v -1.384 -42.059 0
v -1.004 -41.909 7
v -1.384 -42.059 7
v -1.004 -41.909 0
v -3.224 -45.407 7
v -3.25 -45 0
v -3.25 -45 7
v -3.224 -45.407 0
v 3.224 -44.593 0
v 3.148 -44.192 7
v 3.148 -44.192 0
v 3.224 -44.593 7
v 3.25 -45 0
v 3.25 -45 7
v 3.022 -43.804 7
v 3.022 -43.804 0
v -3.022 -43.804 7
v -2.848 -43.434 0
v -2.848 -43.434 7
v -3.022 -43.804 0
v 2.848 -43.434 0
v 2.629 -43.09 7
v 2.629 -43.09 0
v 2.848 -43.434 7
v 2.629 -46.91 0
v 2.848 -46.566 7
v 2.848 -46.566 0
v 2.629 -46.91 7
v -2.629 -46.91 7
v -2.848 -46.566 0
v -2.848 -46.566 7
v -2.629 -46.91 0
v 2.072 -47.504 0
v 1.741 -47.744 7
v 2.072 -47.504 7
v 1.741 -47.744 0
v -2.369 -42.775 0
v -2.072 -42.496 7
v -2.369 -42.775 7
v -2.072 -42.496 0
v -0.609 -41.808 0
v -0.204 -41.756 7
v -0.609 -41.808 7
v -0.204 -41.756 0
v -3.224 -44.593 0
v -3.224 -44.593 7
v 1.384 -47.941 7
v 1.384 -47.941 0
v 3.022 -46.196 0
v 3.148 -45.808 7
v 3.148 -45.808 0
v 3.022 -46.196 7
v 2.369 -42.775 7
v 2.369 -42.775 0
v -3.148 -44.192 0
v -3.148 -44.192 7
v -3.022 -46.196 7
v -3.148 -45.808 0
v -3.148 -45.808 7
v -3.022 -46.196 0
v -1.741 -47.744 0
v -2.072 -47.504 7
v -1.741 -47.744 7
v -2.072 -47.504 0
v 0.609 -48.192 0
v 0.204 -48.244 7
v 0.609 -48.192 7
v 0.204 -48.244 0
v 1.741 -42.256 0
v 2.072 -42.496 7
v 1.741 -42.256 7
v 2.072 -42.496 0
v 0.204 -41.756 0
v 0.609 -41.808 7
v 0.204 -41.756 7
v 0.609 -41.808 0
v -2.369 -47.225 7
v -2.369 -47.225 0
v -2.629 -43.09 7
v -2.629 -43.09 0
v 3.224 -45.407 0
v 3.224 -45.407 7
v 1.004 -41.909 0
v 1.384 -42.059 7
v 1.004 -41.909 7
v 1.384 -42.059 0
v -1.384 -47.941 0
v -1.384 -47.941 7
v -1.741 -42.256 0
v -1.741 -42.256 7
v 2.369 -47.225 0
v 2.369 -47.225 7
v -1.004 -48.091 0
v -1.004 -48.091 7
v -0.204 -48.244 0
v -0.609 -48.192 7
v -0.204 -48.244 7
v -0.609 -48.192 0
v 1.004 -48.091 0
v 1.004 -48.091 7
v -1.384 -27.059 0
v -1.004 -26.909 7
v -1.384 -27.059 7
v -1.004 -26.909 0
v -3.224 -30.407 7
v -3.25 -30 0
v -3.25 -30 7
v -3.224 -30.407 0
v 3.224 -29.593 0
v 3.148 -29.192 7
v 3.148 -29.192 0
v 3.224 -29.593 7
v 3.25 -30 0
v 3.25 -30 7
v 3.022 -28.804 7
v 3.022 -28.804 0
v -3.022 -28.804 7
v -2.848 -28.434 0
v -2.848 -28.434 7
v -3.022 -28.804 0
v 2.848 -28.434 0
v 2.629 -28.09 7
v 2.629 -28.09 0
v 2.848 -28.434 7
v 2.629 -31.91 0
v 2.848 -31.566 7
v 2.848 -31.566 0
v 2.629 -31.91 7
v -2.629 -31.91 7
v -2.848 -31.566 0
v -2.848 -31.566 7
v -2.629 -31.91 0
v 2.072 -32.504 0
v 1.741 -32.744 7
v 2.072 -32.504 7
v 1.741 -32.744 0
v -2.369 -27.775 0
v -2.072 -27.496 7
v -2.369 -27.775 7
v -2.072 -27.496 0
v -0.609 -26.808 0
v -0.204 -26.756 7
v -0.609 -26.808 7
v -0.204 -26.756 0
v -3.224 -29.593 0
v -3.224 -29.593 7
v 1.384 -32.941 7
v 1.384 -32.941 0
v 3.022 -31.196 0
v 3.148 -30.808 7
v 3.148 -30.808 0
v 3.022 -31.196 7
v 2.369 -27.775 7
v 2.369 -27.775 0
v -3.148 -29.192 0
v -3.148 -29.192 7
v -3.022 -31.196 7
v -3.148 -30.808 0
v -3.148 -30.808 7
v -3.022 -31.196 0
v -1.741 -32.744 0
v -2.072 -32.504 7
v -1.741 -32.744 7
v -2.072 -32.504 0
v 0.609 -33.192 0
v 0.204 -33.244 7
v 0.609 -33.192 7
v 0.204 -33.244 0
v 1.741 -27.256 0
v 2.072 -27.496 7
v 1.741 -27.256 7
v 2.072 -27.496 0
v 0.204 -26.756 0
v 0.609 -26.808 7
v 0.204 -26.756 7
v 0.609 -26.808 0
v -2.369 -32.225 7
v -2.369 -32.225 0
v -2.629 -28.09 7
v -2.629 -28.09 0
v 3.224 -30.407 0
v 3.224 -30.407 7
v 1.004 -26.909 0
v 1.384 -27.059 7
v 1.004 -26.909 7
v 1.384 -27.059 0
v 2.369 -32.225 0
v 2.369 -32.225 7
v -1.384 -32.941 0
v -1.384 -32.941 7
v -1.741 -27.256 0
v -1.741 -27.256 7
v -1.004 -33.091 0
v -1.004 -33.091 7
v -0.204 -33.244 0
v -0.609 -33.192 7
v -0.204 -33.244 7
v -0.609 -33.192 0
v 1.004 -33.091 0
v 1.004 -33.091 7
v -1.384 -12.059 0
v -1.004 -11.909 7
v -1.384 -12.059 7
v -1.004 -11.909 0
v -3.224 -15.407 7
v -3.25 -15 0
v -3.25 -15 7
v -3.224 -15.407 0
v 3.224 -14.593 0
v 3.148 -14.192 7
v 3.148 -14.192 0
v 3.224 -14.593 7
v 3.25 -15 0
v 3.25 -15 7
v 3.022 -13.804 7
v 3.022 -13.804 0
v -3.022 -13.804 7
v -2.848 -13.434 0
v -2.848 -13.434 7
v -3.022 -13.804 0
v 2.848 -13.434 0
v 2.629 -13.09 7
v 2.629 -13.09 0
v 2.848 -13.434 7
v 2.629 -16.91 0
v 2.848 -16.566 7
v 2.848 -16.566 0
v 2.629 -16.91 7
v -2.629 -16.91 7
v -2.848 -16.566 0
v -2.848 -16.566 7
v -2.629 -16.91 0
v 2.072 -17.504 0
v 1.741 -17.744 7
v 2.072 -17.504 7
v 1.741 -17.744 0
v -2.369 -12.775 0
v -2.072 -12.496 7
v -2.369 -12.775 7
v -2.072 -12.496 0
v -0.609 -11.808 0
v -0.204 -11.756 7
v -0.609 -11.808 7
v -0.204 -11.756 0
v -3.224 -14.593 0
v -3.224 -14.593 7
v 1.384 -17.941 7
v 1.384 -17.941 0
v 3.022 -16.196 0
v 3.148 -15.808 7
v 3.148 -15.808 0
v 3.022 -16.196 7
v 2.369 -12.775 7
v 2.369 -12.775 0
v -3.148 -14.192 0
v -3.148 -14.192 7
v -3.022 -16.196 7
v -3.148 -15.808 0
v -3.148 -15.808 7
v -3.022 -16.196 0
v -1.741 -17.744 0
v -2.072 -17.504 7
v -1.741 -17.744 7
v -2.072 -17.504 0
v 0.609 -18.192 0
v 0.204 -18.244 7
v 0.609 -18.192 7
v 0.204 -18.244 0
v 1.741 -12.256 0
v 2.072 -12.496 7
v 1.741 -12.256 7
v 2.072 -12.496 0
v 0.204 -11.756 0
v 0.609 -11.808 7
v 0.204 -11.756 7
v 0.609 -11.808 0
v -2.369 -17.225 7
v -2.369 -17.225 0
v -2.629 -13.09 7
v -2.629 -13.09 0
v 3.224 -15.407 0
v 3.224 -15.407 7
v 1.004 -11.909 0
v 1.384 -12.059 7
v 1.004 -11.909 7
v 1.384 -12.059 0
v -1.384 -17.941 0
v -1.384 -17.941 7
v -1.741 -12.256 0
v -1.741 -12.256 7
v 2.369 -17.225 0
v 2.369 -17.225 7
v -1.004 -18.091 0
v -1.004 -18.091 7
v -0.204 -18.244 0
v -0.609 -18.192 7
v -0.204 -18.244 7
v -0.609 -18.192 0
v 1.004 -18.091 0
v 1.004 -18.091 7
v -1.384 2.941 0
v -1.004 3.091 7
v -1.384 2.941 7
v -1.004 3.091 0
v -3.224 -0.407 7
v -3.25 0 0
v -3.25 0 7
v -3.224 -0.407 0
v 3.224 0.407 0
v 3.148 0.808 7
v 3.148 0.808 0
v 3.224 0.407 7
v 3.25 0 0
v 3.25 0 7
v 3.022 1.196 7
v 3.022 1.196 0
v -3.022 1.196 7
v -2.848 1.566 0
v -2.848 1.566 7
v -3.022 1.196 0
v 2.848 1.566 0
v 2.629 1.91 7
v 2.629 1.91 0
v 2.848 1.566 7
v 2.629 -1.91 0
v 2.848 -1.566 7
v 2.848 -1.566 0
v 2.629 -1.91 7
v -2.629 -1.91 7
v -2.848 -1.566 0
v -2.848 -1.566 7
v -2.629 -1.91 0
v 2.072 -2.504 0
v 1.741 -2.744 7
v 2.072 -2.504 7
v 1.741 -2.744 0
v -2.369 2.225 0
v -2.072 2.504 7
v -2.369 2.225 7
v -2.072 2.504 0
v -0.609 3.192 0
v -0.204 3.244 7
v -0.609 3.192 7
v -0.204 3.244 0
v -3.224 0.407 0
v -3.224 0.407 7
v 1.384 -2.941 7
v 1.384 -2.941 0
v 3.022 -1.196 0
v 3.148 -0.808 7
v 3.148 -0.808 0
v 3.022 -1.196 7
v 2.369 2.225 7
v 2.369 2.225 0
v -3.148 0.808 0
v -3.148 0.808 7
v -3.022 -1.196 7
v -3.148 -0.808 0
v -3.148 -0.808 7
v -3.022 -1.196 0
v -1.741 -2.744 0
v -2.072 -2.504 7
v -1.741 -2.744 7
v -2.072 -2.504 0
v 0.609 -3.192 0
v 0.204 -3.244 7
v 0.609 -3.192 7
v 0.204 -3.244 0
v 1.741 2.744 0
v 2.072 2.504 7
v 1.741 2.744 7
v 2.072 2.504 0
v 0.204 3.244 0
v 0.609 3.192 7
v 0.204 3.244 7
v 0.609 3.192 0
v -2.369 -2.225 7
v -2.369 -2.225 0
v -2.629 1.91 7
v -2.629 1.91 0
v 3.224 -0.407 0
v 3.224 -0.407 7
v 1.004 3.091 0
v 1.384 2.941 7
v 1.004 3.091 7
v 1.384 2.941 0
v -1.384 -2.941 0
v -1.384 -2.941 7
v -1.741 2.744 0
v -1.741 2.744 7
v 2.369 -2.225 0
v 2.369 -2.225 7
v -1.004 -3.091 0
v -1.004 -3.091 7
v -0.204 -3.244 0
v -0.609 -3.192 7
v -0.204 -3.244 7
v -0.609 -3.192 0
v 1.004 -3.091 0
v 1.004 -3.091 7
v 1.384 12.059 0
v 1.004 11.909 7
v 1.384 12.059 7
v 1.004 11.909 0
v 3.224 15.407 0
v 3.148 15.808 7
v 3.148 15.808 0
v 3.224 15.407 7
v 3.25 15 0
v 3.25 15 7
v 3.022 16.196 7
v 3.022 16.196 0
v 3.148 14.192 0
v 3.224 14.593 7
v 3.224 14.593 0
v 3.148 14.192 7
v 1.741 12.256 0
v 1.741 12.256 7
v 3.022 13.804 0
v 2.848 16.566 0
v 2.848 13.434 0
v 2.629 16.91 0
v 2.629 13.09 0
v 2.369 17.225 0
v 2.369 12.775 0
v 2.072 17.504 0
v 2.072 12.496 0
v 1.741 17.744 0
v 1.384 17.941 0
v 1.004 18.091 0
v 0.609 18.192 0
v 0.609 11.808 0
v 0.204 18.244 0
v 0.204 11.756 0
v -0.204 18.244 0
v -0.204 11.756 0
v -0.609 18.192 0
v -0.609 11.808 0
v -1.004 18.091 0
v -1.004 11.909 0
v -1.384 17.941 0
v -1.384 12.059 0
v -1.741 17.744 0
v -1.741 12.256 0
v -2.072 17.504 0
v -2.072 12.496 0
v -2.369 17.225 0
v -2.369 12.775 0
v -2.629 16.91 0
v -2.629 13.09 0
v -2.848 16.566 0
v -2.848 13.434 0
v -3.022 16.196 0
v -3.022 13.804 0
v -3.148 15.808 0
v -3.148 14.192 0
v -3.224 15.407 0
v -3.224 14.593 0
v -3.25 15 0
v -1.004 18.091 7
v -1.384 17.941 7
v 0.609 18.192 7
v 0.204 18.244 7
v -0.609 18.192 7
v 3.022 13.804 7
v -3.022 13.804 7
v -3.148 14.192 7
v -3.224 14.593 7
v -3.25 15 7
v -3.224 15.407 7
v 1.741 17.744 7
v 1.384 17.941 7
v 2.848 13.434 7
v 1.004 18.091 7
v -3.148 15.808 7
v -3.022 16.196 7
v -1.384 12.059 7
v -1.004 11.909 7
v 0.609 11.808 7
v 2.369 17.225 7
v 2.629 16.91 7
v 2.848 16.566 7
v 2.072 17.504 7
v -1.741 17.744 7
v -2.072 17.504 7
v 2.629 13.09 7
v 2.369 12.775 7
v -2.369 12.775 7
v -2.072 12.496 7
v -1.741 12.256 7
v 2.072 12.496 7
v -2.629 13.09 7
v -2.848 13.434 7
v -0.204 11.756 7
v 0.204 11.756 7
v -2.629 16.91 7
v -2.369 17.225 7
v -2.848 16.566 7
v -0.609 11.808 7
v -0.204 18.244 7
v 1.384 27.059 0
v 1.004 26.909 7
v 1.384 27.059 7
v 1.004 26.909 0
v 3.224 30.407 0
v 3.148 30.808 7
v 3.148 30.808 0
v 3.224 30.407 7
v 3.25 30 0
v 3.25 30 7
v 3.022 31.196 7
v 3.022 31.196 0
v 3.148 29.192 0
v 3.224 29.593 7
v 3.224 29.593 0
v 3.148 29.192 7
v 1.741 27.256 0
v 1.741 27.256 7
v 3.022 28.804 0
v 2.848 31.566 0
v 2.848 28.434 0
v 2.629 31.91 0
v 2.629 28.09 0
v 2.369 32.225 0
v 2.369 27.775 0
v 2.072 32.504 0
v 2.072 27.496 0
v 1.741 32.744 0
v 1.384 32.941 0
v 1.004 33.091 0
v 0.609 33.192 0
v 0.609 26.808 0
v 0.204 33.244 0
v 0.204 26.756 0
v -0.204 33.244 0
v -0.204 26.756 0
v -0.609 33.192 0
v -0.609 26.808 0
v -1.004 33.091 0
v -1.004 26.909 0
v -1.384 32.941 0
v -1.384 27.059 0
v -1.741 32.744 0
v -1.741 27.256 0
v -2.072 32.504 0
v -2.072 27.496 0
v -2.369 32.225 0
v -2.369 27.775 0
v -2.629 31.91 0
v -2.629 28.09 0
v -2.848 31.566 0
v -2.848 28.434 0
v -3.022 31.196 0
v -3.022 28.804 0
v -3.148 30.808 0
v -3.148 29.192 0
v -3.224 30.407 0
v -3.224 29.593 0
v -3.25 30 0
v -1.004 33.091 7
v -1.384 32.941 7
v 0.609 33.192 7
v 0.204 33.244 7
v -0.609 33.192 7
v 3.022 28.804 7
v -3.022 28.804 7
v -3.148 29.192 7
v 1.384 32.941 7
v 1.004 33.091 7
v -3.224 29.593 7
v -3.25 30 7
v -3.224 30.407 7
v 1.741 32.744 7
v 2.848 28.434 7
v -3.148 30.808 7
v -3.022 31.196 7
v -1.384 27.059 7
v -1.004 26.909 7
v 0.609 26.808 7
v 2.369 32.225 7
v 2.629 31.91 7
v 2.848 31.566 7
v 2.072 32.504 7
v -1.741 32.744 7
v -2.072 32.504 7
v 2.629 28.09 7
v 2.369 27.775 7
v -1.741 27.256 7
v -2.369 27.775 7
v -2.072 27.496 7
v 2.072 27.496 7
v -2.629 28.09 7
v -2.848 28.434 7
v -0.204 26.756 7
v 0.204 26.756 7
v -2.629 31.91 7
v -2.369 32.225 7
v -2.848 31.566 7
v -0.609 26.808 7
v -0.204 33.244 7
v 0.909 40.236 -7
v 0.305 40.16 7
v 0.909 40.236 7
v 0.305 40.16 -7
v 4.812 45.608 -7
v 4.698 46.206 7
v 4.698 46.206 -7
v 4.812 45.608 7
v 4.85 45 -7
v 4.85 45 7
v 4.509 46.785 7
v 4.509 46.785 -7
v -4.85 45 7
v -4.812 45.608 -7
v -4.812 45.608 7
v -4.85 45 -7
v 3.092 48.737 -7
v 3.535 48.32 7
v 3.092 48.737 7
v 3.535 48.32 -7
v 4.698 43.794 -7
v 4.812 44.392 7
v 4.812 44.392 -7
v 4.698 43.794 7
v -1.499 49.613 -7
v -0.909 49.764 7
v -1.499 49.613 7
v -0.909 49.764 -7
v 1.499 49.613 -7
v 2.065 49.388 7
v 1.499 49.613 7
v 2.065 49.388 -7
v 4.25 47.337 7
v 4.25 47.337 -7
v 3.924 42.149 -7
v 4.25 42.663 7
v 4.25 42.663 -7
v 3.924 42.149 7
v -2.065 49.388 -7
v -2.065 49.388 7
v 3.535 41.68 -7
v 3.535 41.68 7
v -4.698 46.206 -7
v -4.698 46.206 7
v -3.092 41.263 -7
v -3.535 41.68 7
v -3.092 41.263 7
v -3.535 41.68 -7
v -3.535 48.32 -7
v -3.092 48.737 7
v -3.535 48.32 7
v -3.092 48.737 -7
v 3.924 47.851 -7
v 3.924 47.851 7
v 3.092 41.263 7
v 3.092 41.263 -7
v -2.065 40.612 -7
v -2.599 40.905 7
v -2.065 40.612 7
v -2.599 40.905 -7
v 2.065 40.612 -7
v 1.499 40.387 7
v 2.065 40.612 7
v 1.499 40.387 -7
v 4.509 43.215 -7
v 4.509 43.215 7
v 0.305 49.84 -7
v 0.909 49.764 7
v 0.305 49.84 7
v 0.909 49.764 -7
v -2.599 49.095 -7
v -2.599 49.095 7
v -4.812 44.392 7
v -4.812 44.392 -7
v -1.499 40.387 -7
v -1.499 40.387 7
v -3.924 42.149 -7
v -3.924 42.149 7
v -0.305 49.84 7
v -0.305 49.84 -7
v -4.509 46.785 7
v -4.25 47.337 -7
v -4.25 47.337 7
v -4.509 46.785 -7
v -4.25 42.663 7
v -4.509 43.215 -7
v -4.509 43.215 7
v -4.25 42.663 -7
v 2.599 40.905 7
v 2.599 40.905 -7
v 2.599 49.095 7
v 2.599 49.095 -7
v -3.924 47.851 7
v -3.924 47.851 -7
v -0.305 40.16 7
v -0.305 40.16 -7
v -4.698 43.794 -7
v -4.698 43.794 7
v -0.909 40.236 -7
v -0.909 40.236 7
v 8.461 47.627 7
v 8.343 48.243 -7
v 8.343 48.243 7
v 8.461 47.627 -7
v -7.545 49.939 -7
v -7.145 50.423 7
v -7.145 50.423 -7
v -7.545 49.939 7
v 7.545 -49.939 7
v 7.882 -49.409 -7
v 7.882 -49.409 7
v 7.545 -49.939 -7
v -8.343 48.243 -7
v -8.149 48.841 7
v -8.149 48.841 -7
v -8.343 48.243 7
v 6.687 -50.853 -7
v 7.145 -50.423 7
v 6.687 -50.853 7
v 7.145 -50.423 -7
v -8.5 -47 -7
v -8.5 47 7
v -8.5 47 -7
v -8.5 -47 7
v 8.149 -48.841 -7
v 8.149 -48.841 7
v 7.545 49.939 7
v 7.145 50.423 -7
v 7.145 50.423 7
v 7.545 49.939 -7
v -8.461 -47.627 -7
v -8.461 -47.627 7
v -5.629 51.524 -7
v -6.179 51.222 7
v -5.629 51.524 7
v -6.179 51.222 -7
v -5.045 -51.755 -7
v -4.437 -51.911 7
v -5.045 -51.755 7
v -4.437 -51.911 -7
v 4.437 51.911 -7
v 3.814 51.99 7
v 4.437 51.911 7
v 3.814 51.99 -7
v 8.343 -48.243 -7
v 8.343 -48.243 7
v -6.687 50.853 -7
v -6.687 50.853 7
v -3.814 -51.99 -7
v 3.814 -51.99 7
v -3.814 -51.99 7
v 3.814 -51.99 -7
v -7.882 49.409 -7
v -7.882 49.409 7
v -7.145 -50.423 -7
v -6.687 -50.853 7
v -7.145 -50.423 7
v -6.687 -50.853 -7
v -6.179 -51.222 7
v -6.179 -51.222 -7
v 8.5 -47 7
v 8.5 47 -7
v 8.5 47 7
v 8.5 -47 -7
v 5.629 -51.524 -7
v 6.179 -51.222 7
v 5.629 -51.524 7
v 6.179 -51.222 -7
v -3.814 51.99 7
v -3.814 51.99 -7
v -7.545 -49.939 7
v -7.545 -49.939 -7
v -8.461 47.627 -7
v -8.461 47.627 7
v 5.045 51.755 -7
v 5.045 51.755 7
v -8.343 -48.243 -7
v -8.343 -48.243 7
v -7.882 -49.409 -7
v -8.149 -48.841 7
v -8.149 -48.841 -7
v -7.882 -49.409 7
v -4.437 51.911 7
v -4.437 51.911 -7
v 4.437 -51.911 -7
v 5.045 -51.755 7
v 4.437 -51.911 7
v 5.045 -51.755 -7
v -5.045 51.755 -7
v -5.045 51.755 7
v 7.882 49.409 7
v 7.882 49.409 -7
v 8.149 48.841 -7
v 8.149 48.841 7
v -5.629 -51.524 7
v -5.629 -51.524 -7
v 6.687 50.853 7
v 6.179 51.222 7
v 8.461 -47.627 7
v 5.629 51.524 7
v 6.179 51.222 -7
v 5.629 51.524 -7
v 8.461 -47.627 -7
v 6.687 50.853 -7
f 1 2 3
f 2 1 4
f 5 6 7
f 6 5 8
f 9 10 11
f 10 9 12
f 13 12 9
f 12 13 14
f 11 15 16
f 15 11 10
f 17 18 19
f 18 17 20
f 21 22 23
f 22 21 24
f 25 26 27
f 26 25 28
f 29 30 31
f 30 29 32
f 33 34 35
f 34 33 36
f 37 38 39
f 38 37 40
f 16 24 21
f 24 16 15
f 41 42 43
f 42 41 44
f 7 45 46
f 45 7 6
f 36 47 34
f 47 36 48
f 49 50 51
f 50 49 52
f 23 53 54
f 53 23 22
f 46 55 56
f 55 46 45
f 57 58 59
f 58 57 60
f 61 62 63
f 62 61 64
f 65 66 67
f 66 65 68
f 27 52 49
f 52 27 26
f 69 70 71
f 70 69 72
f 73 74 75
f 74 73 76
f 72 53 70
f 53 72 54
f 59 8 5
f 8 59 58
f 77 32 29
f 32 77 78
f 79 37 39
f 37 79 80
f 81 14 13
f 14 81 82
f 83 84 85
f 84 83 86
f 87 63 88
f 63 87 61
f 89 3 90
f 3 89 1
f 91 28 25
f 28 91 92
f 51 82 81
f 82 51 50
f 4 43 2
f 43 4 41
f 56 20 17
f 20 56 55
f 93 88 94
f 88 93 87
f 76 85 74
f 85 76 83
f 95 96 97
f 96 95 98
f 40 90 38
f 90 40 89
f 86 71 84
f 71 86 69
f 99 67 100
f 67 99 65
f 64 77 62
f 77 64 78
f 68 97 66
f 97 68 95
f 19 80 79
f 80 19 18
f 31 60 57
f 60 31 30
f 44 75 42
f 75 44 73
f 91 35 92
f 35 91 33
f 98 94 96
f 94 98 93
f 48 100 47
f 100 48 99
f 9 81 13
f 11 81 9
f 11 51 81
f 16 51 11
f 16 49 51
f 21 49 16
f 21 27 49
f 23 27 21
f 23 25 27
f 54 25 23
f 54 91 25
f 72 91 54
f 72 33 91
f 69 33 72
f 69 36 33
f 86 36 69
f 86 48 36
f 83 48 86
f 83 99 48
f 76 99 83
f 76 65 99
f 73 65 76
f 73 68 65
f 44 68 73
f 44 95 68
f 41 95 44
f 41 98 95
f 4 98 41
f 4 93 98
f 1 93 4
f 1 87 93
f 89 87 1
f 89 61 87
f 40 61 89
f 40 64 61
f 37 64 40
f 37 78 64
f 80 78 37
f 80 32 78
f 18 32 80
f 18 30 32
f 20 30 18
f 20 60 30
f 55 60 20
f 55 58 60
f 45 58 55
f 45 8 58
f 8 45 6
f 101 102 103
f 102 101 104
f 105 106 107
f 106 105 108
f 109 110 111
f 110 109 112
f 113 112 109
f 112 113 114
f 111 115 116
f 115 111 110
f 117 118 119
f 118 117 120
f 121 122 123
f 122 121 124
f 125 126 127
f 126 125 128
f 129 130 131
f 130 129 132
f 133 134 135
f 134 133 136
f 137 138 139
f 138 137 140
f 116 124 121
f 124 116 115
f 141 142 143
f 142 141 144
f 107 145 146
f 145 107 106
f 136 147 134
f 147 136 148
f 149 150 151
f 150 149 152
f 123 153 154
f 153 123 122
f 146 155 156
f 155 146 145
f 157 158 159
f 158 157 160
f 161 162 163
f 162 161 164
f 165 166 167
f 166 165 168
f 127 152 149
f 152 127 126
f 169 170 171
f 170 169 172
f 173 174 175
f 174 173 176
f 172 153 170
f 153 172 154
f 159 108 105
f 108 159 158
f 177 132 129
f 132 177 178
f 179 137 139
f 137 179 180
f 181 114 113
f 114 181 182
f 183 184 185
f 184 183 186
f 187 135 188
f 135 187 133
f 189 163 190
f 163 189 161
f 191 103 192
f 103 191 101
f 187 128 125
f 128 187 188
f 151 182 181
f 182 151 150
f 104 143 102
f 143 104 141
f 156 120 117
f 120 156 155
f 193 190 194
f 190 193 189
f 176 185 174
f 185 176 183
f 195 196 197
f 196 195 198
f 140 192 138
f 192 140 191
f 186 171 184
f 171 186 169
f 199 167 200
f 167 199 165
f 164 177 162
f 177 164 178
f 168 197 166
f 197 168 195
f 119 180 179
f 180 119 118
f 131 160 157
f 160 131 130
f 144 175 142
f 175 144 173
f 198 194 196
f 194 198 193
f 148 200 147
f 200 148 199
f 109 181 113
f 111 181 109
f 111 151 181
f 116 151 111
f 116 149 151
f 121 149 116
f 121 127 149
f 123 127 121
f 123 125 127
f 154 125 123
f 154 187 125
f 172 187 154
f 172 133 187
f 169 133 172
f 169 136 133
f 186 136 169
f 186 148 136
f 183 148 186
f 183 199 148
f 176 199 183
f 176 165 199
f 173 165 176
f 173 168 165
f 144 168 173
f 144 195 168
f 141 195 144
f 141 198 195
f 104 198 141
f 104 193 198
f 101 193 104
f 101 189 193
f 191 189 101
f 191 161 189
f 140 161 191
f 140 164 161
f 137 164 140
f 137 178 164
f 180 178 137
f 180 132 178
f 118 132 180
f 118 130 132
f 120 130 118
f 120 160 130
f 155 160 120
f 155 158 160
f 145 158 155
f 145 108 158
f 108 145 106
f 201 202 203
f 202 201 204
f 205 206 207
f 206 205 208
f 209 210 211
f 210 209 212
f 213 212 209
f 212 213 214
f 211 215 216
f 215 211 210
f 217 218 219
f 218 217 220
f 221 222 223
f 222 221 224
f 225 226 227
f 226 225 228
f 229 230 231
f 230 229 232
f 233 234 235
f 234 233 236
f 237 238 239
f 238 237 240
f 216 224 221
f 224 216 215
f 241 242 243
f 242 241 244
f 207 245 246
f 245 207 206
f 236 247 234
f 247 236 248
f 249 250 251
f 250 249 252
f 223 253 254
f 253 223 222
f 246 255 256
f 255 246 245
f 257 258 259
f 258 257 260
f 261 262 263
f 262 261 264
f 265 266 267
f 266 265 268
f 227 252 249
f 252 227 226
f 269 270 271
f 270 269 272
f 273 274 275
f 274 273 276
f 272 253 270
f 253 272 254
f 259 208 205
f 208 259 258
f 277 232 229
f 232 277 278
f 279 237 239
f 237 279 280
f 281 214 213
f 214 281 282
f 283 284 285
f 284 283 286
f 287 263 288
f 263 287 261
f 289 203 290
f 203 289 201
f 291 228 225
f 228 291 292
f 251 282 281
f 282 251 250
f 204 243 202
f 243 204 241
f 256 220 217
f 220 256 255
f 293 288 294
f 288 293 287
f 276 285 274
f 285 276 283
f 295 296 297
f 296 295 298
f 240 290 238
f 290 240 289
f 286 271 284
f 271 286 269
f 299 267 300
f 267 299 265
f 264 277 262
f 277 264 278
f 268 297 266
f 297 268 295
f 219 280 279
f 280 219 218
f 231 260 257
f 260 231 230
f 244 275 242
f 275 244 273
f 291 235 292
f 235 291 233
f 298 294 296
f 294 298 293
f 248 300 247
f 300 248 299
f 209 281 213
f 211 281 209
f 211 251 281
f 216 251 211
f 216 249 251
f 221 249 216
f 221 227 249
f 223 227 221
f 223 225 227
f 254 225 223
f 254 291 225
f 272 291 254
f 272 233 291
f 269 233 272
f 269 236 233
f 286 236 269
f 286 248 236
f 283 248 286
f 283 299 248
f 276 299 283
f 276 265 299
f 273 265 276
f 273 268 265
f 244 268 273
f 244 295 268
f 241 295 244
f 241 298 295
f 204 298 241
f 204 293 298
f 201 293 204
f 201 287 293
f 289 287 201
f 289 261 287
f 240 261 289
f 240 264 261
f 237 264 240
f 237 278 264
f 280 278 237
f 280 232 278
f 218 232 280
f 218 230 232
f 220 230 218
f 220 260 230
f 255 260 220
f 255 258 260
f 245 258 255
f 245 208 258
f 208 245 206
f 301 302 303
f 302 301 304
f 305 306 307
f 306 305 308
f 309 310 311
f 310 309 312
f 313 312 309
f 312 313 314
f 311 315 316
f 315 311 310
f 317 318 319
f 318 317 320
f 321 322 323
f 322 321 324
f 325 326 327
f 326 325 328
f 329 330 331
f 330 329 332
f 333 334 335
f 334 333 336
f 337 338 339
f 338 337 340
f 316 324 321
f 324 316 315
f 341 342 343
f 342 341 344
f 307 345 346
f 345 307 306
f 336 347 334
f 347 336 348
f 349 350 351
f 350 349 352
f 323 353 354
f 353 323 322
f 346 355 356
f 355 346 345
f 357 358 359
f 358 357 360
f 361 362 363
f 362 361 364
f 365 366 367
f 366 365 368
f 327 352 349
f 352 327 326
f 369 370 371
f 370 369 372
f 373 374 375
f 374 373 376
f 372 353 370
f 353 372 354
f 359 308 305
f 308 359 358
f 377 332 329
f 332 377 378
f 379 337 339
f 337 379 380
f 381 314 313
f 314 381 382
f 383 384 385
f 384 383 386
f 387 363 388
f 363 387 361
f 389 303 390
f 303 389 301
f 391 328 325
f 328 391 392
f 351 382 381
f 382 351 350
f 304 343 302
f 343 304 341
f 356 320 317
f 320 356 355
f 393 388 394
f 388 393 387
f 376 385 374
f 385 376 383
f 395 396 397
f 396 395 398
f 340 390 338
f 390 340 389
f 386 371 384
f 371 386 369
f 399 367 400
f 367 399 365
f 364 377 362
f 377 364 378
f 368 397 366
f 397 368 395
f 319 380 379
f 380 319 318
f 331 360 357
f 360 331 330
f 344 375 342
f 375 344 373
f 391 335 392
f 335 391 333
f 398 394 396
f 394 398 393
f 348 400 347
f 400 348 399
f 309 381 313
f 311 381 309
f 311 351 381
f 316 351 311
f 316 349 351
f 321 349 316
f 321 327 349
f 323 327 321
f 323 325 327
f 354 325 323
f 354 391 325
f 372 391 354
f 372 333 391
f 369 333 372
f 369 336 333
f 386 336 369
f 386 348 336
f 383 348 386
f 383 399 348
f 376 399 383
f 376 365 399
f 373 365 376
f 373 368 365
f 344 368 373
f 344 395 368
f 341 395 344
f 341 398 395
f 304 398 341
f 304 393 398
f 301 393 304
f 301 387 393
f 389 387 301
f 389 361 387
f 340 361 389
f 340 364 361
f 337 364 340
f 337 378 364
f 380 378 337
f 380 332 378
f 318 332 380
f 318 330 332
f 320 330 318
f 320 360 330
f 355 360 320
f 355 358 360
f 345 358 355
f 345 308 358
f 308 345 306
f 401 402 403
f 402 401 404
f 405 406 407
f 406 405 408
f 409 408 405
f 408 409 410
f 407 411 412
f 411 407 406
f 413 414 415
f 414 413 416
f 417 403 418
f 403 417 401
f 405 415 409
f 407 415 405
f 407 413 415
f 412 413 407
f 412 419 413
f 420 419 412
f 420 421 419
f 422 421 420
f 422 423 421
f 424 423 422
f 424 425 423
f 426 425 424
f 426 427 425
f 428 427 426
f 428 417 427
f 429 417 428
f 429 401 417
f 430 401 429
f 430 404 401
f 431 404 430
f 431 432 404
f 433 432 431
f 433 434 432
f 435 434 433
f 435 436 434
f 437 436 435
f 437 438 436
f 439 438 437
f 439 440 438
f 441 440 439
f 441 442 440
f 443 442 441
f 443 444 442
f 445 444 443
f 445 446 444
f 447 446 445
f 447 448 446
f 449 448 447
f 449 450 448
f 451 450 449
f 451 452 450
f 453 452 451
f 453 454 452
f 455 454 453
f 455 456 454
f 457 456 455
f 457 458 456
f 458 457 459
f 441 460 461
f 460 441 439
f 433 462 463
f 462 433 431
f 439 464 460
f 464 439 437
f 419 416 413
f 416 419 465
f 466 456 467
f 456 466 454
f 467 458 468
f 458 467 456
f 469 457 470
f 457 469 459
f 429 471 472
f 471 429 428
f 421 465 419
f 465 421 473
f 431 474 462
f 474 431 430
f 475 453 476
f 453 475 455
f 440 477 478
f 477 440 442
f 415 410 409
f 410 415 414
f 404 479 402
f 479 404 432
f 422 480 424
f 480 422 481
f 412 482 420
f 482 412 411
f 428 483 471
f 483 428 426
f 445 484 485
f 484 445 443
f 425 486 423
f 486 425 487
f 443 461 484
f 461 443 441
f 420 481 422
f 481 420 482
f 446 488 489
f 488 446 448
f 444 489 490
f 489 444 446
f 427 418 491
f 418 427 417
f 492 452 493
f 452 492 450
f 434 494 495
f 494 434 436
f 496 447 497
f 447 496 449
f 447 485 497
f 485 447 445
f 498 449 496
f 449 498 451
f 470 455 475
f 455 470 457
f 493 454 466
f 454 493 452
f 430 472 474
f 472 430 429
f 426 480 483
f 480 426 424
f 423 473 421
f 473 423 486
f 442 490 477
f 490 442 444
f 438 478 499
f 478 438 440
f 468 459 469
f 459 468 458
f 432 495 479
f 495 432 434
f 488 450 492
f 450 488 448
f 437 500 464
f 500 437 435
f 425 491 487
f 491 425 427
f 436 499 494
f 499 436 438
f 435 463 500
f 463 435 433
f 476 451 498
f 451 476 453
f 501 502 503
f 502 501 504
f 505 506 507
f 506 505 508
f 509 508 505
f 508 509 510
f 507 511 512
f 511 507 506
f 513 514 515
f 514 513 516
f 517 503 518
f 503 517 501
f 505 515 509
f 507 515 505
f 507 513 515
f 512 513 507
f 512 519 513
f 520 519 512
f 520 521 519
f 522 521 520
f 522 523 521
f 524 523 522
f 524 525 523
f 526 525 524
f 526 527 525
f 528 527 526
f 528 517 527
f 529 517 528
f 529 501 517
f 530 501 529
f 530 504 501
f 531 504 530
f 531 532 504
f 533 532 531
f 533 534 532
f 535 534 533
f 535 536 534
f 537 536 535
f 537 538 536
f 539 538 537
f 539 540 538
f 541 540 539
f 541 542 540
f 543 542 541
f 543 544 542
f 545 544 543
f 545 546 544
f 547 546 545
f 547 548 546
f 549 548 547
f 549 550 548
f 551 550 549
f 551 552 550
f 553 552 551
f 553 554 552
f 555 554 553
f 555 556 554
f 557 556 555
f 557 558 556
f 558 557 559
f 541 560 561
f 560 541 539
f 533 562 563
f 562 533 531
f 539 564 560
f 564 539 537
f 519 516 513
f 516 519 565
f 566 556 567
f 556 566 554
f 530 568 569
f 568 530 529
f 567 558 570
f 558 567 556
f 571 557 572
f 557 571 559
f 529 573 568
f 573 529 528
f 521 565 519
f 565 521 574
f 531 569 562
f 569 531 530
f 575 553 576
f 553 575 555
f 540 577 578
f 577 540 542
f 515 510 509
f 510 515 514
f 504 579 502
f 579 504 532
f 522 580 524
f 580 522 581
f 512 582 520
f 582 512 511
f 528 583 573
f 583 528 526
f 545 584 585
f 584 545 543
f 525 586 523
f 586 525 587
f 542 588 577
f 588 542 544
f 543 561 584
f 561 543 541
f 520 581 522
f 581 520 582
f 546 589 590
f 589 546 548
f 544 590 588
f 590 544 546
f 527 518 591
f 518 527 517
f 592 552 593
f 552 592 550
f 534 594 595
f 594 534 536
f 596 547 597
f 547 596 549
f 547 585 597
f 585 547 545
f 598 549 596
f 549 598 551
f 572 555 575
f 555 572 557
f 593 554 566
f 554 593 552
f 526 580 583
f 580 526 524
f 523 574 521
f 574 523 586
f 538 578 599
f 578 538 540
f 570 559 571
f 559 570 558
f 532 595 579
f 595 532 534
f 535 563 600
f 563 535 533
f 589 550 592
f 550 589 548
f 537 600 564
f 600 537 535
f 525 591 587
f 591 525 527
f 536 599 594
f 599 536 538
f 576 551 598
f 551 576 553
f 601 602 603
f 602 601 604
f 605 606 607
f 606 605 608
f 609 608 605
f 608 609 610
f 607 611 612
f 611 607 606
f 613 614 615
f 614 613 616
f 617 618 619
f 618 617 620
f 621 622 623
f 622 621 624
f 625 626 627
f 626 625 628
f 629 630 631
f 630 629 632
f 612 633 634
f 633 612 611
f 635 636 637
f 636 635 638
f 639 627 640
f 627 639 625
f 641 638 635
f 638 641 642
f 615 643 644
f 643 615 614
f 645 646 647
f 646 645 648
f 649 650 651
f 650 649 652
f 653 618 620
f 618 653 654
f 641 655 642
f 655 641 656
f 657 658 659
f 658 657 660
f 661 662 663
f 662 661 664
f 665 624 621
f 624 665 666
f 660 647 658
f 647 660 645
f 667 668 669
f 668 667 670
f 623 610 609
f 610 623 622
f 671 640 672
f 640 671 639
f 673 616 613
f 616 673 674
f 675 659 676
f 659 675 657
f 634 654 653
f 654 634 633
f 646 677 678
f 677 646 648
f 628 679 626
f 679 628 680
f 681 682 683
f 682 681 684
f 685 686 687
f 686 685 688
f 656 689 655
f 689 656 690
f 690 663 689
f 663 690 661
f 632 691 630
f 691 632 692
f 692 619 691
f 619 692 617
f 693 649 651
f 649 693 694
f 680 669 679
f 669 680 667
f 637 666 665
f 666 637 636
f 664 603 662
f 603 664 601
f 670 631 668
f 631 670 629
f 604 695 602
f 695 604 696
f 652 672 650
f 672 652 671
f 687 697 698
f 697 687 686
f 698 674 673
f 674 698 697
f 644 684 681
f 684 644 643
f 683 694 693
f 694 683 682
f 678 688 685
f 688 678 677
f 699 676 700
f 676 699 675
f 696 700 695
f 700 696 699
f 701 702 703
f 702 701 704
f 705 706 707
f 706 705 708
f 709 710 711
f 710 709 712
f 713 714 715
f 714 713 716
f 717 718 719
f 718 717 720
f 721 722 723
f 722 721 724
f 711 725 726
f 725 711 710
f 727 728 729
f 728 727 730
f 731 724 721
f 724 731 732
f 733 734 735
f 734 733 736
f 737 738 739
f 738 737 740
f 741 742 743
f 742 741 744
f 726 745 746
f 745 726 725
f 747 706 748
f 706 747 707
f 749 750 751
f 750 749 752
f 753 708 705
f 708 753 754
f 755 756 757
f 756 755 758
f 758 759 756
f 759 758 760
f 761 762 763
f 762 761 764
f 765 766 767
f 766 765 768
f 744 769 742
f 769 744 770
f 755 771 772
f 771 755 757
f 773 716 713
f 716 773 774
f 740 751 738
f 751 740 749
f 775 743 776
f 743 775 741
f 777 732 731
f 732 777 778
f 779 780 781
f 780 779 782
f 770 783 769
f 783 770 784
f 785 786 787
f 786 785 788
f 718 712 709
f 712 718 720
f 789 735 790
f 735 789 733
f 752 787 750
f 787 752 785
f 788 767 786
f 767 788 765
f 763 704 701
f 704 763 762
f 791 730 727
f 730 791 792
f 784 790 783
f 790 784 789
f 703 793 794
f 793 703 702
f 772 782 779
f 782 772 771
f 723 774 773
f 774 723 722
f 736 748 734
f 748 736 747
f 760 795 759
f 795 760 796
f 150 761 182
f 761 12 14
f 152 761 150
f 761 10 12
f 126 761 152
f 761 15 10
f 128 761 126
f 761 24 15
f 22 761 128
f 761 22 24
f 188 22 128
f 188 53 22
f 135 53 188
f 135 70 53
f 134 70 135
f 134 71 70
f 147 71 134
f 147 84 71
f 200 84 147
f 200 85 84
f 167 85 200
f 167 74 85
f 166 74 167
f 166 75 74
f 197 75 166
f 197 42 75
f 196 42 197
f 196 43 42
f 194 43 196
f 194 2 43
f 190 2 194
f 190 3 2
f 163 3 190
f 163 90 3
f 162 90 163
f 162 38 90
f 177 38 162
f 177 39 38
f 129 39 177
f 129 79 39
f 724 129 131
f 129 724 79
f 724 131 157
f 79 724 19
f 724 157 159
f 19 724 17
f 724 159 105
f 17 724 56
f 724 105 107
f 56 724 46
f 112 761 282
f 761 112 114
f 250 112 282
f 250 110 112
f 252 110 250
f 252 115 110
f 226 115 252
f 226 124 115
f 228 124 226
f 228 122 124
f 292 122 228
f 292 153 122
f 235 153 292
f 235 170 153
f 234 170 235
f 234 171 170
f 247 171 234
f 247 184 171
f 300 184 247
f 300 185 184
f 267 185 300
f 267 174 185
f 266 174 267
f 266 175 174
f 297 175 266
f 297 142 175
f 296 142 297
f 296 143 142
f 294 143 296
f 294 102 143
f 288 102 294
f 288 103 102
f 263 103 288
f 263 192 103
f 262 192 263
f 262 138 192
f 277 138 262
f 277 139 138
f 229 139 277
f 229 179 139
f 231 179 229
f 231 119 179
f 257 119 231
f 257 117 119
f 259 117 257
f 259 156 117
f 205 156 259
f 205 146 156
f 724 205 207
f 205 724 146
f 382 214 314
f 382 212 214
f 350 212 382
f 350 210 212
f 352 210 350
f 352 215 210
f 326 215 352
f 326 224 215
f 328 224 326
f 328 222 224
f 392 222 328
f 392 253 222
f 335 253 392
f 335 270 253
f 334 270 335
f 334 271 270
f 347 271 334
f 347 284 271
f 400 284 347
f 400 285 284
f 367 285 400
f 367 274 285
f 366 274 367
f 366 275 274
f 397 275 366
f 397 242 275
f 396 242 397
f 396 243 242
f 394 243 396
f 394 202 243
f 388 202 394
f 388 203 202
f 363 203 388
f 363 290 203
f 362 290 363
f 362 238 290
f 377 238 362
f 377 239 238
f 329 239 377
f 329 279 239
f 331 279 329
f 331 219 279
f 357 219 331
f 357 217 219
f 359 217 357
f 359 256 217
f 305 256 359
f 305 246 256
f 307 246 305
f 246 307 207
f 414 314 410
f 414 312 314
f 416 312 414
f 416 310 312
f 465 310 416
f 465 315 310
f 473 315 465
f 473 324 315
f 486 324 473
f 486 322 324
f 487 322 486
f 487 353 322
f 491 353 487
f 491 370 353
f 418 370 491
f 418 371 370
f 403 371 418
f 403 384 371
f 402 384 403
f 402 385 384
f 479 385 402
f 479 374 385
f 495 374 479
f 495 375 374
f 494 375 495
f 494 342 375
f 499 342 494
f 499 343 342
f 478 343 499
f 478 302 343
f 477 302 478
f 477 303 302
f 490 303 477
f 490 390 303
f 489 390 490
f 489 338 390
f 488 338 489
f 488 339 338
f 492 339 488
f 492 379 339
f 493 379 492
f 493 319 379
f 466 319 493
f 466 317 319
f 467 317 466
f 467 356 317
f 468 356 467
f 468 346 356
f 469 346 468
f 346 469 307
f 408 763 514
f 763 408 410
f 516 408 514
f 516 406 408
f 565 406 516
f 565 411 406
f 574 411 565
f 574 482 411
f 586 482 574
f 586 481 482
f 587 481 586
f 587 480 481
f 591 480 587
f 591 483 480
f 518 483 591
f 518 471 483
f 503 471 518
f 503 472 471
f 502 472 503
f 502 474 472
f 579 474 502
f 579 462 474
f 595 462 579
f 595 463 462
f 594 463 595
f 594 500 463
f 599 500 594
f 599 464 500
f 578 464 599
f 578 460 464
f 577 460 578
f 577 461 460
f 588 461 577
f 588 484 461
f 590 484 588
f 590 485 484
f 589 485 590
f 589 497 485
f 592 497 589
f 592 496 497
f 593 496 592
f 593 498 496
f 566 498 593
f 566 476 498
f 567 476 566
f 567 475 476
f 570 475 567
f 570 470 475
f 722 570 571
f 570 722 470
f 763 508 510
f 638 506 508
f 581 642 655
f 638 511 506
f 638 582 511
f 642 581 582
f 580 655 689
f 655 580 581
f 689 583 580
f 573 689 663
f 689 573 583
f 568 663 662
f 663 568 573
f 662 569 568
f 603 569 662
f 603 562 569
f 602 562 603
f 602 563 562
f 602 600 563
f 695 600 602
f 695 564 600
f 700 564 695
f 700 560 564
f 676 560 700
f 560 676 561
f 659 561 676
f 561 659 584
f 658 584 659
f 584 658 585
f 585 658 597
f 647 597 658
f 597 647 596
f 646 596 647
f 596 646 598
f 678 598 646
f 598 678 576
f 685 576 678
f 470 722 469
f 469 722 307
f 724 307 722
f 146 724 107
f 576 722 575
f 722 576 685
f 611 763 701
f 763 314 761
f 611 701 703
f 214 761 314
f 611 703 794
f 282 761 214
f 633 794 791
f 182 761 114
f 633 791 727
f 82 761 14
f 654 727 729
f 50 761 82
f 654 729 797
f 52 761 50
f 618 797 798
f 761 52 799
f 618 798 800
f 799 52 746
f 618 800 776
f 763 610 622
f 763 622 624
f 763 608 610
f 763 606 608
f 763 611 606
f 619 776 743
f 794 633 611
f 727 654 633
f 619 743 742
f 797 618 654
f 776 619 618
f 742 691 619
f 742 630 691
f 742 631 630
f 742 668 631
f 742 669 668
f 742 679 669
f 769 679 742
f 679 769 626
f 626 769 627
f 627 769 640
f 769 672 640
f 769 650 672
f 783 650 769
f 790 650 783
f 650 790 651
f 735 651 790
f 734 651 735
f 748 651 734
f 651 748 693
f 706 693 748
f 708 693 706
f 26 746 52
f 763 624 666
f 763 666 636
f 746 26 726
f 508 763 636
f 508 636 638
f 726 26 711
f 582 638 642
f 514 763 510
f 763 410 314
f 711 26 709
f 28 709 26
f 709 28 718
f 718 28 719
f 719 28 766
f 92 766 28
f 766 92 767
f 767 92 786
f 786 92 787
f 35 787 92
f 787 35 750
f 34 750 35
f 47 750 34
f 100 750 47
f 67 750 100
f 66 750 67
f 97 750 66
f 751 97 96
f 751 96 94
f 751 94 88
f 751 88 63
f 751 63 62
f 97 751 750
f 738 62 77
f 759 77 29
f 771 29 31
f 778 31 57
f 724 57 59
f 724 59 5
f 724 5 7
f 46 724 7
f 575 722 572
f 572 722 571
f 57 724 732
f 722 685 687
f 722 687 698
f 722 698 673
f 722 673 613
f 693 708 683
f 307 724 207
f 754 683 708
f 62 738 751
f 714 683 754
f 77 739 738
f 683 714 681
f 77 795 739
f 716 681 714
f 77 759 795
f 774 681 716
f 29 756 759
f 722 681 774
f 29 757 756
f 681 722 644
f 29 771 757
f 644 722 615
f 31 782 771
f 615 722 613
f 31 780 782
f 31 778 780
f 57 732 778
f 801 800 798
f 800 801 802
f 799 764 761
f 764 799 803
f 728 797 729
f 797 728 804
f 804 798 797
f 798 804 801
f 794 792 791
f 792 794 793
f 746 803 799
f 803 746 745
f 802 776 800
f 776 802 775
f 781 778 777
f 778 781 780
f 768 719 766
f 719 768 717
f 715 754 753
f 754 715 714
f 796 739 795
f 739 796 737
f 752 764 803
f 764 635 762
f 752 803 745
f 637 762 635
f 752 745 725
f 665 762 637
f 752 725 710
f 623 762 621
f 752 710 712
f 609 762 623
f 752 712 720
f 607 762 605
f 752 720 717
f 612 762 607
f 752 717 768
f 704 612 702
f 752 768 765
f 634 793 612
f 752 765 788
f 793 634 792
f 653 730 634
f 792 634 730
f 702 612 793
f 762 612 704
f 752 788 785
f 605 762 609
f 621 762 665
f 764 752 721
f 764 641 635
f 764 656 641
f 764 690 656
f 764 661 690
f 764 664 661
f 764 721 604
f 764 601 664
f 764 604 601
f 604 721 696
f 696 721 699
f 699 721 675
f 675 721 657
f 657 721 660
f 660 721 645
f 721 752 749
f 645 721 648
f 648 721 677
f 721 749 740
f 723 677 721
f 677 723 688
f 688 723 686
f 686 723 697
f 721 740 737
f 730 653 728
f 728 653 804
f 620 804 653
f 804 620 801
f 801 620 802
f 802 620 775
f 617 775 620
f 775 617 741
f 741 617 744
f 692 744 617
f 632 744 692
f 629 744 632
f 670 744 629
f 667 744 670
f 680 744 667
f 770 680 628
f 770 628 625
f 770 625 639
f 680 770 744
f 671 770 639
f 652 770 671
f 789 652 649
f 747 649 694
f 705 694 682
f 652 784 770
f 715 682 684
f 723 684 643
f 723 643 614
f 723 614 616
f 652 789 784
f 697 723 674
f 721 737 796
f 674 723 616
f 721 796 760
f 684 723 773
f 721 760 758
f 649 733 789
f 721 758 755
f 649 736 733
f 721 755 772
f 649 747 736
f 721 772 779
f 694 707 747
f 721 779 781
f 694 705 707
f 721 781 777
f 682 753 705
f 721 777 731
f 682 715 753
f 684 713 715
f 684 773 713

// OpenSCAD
$fn = 50;


difference() {
	union() {
		translate(v = [0, 0, -7.0000000000]) {
			hull() {
				translate(v = [-3.5000000000, 47.0000000000, 0]) {
					cylinder(h = 14, r = 5);
				}
				translate(v = [3.5000000000, 47.0000000000, 0]) {
					cylinder(h = 14, r = 5);
				}
				translate(v = [-3.5000000000, -47.0000000000, 0]) {
					cylinder(h = 14, r = 5);
				}
				translate(v = [3.5000000000, -47.0000000000, 0]) {
					cylinder(h = 14, r = 5);
				}
			}
		}
	}
	union() {
		translate(v = [0.0000000000, -45.0000000000, 0]) {
			cylinder(h = 100, r = 3.2500000000);
		}
		translate(v = [0.0000000000, -30.0000000000, 0]) {
			cylinder(h = 100, r = 3.2500000000);
		}
		translate(v = [0.0000000000, -15.0000000000, 0]) {
			cylinder(h = 100, r = 3.2500000000);
		}
		cylinder(h = 100, r = 3.2500000000);
		translate(v = [0.0000000000, 15.0000000000, 0]) {
			cylinder(h = 100, r = 3.2500000000);
		}
		translate(v = [0.0000000000, 30.0000000000, 0]) {
			cylinder(h = 100, r = 3.2500000000);
		}
		translate(v = [0, 45, -100.0000000000]) {
			cylinder(h = 200, r = 4.8500000000);
		}
	}
}
